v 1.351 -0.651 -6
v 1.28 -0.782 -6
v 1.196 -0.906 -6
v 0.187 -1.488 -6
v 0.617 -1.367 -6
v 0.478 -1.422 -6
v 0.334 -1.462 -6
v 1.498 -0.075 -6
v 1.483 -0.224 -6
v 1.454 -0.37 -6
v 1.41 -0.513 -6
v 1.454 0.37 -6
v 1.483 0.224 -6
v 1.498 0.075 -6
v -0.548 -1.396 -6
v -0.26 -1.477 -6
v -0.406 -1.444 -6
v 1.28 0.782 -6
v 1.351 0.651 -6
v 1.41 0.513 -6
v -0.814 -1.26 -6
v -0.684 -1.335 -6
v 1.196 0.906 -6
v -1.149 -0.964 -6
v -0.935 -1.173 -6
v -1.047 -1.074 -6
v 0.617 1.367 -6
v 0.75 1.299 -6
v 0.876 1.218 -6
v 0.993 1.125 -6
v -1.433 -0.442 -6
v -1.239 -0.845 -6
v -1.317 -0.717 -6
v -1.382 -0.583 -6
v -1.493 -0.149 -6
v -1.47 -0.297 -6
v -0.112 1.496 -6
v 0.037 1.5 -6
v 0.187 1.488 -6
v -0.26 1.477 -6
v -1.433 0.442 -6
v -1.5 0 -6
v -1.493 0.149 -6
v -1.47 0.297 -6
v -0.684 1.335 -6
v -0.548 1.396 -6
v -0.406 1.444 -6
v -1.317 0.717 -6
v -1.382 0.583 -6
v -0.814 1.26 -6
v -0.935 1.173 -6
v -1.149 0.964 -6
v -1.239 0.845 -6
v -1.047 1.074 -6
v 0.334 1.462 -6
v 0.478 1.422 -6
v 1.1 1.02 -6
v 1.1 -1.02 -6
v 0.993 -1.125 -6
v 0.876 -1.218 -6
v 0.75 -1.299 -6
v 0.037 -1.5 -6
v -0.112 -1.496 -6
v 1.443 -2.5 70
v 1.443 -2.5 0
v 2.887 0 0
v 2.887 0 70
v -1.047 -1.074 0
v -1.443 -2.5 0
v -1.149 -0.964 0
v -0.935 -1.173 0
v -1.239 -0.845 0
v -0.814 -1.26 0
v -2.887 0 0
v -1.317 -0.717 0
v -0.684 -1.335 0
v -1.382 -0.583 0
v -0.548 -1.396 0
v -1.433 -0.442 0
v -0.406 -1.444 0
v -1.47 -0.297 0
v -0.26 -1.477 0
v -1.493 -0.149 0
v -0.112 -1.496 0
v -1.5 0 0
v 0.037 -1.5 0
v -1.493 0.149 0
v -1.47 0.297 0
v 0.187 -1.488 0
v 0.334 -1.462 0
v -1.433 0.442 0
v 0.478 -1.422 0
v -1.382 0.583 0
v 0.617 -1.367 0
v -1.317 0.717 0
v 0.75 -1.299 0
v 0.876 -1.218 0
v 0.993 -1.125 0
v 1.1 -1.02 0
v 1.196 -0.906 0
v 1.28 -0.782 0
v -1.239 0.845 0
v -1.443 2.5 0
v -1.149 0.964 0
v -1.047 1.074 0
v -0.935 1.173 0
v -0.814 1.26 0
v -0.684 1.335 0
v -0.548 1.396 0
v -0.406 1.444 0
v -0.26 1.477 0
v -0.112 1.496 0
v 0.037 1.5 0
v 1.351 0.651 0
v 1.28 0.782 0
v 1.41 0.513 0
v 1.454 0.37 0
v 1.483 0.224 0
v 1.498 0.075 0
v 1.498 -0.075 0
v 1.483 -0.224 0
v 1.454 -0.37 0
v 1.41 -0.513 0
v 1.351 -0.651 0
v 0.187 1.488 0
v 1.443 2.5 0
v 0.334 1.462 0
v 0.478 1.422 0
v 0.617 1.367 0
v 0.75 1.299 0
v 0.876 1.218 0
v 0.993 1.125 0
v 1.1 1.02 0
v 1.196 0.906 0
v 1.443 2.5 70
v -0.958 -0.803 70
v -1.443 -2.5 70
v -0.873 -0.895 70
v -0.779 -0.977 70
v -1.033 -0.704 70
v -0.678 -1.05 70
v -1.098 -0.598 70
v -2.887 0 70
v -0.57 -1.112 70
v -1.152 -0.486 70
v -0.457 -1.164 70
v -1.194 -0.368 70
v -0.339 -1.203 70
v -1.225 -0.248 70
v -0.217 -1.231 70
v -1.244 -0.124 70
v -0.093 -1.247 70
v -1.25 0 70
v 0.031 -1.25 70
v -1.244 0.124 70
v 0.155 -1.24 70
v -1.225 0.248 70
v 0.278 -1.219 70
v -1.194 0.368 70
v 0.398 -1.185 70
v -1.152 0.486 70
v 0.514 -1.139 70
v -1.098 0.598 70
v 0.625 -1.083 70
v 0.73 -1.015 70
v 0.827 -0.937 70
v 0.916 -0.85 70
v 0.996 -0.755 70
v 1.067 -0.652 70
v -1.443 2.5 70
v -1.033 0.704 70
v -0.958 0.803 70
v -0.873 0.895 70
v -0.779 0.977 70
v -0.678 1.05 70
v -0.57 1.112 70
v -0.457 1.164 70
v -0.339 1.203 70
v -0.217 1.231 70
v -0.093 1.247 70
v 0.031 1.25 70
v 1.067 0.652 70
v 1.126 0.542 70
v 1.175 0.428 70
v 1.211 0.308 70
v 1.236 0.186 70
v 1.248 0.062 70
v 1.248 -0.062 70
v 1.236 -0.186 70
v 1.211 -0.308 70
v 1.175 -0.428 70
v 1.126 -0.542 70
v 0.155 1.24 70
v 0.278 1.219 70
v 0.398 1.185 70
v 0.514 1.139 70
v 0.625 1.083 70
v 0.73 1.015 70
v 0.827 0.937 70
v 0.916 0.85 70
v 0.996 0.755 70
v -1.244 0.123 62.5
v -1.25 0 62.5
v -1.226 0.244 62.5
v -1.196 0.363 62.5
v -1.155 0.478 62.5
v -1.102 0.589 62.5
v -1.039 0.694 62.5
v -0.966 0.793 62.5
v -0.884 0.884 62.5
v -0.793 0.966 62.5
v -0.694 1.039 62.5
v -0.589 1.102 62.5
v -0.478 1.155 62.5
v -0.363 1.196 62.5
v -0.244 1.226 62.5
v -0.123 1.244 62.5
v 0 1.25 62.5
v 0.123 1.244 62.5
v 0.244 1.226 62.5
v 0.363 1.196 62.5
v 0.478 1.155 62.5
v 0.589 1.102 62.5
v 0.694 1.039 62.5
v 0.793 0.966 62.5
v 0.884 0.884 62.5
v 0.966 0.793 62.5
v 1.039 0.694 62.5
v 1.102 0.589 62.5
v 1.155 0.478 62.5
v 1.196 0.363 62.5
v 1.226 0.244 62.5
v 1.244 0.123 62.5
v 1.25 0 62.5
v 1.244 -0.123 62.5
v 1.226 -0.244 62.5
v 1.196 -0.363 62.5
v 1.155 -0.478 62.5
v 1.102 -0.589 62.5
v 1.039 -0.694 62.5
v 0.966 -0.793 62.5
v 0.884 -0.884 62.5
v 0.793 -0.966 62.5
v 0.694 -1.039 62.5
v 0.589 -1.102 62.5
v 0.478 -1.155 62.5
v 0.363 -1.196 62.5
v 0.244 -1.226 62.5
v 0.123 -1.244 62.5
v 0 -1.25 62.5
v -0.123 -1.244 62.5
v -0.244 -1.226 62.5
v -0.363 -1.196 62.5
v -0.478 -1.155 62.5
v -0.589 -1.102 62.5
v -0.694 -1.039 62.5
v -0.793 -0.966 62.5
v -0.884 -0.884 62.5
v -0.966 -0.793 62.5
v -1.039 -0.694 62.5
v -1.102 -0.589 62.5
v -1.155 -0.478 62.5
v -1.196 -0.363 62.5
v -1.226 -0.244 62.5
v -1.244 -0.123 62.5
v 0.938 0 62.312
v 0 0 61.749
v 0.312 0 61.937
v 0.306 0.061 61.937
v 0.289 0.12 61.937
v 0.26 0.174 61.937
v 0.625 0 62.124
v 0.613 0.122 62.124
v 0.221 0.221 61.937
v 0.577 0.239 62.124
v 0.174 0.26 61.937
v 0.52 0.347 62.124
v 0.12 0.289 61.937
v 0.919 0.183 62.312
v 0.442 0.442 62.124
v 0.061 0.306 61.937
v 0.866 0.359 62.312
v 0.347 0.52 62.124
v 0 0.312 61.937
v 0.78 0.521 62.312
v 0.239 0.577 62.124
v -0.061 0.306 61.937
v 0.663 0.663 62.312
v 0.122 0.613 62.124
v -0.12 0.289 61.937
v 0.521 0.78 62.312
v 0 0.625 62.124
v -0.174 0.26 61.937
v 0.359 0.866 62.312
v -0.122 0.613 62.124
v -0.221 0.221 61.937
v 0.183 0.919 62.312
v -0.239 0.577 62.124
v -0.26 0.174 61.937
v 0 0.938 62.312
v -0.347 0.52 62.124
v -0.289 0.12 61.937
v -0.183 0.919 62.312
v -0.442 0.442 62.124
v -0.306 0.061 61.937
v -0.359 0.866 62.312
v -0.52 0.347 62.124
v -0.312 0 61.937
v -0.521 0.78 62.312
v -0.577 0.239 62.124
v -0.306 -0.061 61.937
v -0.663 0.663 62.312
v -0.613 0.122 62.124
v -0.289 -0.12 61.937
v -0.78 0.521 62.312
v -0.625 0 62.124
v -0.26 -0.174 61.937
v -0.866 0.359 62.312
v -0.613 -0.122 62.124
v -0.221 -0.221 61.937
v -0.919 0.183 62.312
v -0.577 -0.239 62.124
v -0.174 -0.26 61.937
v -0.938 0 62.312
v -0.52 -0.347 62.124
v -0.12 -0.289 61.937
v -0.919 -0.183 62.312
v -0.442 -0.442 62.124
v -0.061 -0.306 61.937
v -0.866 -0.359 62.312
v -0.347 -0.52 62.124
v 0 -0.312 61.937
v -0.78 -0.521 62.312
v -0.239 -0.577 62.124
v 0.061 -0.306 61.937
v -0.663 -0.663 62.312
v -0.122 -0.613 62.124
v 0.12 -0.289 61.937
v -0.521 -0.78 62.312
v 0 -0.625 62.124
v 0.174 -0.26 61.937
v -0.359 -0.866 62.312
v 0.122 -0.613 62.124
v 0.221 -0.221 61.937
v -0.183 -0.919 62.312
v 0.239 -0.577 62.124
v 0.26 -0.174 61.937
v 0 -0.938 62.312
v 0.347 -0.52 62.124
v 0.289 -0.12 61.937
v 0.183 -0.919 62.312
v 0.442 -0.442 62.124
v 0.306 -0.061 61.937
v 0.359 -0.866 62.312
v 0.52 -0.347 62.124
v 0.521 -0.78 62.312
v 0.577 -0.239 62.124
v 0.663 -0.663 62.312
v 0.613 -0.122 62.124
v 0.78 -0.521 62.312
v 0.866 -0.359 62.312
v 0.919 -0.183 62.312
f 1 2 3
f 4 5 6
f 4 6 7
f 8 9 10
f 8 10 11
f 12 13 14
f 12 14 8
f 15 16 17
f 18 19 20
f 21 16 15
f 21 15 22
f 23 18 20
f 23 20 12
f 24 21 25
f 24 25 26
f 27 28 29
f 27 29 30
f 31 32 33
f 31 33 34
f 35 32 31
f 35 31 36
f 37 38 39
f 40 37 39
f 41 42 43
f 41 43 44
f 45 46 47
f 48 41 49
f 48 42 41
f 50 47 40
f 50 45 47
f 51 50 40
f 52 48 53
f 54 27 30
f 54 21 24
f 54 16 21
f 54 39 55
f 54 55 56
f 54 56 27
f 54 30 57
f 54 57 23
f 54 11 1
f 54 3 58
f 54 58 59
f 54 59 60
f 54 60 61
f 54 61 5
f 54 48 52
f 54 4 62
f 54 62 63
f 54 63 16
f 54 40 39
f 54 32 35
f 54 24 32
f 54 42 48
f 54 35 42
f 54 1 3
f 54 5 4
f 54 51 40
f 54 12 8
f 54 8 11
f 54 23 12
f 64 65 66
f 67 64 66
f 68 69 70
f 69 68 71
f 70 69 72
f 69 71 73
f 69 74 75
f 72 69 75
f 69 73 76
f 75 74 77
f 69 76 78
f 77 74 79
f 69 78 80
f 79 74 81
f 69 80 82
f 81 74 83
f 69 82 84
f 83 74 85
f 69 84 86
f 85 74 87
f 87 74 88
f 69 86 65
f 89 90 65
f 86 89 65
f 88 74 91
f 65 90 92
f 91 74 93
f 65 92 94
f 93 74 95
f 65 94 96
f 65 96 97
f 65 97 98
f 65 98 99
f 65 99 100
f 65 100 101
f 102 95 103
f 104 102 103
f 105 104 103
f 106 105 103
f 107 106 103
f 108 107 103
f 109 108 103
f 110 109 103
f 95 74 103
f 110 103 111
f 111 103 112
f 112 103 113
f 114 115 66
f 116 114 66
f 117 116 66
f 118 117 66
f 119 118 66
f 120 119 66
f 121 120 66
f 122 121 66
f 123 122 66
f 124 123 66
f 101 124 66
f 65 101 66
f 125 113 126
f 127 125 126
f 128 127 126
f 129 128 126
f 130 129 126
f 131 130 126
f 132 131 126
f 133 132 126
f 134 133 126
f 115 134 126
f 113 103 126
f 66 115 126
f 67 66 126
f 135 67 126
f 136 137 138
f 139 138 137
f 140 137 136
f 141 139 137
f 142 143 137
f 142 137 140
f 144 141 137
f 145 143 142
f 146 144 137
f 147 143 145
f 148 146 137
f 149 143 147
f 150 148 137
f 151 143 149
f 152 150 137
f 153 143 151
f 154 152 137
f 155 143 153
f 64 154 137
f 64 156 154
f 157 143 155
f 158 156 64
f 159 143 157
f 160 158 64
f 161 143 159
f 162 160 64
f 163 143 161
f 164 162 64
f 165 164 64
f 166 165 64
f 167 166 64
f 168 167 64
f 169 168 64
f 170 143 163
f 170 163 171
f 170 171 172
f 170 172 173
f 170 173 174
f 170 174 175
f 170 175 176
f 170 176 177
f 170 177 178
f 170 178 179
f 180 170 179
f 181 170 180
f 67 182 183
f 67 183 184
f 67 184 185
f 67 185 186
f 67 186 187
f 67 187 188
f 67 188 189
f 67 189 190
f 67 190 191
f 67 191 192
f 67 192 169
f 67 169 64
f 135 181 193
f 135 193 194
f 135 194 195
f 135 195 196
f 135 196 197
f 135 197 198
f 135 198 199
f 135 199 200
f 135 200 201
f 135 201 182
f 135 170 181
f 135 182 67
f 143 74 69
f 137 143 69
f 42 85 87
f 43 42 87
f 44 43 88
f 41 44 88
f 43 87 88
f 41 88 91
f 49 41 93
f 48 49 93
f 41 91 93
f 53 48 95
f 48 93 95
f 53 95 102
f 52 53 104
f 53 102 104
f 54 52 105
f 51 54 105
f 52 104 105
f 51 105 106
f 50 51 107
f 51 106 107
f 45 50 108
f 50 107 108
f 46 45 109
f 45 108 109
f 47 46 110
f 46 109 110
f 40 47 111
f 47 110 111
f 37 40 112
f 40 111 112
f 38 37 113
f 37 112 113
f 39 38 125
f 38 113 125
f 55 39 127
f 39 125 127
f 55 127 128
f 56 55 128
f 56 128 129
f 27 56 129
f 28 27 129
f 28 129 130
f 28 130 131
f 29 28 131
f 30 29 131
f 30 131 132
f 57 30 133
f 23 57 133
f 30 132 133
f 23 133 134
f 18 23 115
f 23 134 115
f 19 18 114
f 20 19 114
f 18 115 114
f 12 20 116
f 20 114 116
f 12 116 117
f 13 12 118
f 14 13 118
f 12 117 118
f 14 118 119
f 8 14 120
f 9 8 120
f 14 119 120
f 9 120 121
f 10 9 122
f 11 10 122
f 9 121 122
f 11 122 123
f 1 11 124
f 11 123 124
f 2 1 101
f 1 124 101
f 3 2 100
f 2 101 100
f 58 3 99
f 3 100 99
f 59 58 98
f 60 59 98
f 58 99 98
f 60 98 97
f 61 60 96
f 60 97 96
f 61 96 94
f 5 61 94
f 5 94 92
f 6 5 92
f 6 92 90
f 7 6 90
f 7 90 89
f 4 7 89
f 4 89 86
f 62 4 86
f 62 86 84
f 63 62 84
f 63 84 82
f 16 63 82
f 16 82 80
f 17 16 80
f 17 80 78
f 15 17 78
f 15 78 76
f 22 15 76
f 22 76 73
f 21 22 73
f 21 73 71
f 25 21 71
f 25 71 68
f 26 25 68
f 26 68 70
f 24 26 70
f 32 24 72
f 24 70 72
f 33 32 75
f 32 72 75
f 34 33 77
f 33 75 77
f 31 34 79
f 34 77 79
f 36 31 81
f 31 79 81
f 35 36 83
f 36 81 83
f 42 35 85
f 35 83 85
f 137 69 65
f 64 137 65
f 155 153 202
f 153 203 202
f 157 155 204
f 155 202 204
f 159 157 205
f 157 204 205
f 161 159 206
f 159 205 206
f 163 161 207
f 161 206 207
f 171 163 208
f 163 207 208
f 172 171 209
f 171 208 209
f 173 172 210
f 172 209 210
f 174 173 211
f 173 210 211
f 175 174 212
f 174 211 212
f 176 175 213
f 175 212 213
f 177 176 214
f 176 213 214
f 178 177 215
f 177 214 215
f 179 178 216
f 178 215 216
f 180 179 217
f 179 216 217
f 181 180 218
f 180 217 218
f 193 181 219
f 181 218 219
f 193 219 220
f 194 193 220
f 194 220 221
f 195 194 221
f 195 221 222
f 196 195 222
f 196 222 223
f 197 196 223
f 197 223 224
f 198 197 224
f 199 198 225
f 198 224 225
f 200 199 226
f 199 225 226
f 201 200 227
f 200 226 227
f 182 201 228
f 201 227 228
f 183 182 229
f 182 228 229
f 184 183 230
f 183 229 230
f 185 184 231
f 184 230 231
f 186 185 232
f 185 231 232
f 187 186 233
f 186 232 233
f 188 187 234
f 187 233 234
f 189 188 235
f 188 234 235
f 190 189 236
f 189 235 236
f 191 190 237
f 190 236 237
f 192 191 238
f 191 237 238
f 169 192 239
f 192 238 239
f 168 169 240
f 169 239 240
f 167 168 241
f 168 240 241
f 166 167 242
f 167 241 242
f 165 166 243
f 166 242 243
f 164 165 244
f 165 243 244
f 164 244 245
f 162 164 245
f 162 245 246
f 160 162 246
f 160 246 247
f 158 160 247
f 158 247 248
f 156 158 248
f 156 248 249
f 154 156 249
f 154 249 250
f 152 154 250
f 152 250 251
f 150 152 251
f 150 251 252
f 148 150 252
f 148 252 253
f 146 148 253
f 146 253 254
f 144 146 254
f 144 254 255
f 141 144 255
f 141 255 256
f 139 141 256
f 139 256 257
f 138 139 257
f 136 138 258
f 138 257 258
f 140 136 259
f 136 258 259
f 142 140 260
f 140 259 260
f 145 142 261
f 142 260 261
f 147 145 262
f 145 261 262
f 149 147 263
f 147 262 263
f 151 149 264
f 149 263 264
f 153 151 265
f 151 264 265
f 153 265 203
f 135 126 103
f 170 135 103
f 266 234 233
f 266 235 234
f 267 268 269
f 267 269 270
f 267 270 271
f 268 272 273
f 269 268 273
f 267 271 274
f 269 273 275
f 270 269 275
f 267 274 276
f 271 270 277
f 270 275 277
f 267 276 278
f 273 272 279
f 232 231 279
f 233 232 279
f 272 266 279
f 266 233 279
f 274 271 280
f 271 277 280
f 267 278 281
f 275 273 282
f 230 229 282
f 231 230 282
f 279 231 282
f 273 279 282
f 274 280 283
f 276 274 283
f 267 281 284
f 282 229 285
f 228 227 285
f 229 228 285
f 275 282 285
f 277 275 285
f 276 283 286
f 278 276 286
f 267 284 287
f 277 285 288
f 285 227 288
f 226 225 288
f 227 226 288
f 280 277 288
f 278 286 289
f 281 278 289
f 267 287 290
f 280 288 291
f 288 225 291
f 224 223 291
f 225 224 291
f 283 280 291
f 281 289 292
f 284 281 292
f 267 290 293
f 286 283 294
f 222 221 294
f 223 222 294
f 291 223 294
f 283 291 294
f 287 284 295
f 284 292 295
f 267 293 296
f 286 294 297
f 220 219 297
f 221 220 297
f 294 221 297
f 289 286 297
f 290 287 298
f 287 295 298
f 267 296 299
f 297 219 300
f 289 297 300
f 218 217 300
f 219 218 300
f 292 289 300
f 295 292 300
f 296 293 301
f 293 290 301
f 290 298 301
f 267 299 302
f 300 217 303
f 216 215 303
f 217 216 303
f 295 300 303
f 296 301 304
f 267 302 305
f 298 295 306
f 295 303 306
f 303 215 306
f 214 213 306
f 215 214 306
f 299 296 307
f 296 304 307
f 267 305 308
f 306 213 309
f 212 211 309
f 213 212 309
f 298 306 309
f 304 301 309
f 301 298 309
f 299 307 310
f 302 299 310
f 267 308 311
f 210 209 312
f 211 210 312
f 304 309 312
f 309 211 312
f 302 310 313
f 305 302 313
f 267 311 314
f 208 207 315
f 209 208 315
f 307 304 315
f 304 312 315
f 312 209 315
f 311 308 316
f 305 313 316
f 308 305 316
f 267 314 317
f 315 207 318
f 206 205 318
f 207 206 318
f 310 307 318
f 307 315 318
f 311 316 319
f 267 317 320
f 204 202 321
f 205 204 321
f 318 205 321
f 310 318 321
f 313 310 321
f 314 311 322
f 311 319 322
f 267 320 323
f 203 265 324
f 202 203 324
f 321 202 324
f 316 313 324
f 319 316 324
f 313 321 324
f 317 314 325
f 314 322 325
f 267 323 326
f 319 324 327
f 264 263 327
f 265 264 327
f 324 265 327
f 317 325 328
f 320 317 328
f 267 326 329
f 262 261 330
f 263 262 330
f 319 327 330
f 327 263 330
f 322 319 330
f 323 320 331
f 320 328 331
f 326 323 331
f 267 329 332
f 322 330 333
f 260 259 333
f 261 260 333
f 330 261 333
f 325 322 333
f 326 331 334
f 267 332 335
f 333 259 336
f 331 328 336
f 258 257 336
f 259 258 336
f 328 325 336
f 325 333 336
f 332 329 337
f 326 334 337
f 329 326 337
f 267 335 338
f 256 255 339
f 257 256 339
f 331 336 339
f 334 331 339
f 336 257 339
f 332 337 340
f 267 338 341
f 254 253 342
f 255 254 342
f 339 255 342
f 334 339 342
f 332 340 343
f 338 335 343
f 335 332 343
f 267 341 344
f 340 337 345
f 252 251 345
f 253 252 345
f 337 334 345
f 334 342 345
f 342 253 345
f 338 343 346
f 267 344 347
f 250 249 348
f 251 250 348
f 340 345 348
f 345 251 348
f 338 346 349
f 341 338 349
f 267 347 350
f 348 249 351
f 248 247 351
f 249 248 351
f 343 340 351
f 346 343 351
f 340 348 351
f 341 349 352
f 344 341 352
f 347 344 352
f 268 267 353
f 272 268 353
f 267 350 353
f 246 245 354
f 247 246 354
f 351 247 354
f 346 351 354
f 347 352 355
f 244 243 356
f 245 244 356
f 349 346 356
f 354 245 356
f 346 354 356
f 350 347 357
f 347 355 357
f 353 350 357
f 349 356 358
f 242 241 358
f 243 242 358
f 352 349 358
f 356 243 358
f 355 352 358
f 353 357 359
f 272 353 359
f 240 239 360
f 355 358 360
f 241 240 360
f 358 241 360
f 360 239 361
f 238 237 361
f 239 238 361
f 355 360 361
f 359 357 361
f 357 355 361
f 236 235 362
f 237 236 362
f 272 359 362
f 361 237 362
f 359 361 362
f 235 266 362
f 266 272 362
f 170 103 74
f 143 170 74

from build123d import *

# Parameters (mm, degrees)
EXTRUDE_1_DEPTH = 70
SKETCH_4_R      = 1.5
EXTRUDE_2_DEPTH = 6
M3X0_5_1_D      = 2.5
M3X0_5_1_DEPTH  = 7.5
M3X0_5_1_TIP    = 0.751075774


with BuildPart() as part:
    # 草圖1 → 填料-伸長1 (new body)
    with BuildSketch(Plane.XY):
        Polygon((-1.443375673, 2.5), (-2.886751346, 0), (-1.443375673, -2.5), (1.443375673, -2.5), (2.886751346, 0), (1.443375673, 2.5), align=None)
    extrude(amount=EXTRUDE_1_DEPTH)

    # 草圖4 → 填料-伸長2 (add)
    with BuildSketch(Plane(origin=(0, 0, 0), x_dir=(-1, 0, 0), z_dir=(0, 0, -1))):
        Circle(SKETCH_4_R)
    extrude(amount=EXTRUDE_2_DEPTH)

    # M3x0.5 螺紋孔1
    with Locations(Plane.XY.offset(70)):
        with Locations((0, 0)):
            Hole(M3X0_5_1_D / 2, depth=M3X0_5_1_DEPTH)
            with Locations((0, 0, -(M3X0_5_1_DEPTH + M3X0_5_1_TIP / 2))):  # 118° drill point
                Cone(0, M3X0_5_1_D / 2, M3X0_5_1_TIP, mode=Mode.SUBTRACT)


solid = part.part
